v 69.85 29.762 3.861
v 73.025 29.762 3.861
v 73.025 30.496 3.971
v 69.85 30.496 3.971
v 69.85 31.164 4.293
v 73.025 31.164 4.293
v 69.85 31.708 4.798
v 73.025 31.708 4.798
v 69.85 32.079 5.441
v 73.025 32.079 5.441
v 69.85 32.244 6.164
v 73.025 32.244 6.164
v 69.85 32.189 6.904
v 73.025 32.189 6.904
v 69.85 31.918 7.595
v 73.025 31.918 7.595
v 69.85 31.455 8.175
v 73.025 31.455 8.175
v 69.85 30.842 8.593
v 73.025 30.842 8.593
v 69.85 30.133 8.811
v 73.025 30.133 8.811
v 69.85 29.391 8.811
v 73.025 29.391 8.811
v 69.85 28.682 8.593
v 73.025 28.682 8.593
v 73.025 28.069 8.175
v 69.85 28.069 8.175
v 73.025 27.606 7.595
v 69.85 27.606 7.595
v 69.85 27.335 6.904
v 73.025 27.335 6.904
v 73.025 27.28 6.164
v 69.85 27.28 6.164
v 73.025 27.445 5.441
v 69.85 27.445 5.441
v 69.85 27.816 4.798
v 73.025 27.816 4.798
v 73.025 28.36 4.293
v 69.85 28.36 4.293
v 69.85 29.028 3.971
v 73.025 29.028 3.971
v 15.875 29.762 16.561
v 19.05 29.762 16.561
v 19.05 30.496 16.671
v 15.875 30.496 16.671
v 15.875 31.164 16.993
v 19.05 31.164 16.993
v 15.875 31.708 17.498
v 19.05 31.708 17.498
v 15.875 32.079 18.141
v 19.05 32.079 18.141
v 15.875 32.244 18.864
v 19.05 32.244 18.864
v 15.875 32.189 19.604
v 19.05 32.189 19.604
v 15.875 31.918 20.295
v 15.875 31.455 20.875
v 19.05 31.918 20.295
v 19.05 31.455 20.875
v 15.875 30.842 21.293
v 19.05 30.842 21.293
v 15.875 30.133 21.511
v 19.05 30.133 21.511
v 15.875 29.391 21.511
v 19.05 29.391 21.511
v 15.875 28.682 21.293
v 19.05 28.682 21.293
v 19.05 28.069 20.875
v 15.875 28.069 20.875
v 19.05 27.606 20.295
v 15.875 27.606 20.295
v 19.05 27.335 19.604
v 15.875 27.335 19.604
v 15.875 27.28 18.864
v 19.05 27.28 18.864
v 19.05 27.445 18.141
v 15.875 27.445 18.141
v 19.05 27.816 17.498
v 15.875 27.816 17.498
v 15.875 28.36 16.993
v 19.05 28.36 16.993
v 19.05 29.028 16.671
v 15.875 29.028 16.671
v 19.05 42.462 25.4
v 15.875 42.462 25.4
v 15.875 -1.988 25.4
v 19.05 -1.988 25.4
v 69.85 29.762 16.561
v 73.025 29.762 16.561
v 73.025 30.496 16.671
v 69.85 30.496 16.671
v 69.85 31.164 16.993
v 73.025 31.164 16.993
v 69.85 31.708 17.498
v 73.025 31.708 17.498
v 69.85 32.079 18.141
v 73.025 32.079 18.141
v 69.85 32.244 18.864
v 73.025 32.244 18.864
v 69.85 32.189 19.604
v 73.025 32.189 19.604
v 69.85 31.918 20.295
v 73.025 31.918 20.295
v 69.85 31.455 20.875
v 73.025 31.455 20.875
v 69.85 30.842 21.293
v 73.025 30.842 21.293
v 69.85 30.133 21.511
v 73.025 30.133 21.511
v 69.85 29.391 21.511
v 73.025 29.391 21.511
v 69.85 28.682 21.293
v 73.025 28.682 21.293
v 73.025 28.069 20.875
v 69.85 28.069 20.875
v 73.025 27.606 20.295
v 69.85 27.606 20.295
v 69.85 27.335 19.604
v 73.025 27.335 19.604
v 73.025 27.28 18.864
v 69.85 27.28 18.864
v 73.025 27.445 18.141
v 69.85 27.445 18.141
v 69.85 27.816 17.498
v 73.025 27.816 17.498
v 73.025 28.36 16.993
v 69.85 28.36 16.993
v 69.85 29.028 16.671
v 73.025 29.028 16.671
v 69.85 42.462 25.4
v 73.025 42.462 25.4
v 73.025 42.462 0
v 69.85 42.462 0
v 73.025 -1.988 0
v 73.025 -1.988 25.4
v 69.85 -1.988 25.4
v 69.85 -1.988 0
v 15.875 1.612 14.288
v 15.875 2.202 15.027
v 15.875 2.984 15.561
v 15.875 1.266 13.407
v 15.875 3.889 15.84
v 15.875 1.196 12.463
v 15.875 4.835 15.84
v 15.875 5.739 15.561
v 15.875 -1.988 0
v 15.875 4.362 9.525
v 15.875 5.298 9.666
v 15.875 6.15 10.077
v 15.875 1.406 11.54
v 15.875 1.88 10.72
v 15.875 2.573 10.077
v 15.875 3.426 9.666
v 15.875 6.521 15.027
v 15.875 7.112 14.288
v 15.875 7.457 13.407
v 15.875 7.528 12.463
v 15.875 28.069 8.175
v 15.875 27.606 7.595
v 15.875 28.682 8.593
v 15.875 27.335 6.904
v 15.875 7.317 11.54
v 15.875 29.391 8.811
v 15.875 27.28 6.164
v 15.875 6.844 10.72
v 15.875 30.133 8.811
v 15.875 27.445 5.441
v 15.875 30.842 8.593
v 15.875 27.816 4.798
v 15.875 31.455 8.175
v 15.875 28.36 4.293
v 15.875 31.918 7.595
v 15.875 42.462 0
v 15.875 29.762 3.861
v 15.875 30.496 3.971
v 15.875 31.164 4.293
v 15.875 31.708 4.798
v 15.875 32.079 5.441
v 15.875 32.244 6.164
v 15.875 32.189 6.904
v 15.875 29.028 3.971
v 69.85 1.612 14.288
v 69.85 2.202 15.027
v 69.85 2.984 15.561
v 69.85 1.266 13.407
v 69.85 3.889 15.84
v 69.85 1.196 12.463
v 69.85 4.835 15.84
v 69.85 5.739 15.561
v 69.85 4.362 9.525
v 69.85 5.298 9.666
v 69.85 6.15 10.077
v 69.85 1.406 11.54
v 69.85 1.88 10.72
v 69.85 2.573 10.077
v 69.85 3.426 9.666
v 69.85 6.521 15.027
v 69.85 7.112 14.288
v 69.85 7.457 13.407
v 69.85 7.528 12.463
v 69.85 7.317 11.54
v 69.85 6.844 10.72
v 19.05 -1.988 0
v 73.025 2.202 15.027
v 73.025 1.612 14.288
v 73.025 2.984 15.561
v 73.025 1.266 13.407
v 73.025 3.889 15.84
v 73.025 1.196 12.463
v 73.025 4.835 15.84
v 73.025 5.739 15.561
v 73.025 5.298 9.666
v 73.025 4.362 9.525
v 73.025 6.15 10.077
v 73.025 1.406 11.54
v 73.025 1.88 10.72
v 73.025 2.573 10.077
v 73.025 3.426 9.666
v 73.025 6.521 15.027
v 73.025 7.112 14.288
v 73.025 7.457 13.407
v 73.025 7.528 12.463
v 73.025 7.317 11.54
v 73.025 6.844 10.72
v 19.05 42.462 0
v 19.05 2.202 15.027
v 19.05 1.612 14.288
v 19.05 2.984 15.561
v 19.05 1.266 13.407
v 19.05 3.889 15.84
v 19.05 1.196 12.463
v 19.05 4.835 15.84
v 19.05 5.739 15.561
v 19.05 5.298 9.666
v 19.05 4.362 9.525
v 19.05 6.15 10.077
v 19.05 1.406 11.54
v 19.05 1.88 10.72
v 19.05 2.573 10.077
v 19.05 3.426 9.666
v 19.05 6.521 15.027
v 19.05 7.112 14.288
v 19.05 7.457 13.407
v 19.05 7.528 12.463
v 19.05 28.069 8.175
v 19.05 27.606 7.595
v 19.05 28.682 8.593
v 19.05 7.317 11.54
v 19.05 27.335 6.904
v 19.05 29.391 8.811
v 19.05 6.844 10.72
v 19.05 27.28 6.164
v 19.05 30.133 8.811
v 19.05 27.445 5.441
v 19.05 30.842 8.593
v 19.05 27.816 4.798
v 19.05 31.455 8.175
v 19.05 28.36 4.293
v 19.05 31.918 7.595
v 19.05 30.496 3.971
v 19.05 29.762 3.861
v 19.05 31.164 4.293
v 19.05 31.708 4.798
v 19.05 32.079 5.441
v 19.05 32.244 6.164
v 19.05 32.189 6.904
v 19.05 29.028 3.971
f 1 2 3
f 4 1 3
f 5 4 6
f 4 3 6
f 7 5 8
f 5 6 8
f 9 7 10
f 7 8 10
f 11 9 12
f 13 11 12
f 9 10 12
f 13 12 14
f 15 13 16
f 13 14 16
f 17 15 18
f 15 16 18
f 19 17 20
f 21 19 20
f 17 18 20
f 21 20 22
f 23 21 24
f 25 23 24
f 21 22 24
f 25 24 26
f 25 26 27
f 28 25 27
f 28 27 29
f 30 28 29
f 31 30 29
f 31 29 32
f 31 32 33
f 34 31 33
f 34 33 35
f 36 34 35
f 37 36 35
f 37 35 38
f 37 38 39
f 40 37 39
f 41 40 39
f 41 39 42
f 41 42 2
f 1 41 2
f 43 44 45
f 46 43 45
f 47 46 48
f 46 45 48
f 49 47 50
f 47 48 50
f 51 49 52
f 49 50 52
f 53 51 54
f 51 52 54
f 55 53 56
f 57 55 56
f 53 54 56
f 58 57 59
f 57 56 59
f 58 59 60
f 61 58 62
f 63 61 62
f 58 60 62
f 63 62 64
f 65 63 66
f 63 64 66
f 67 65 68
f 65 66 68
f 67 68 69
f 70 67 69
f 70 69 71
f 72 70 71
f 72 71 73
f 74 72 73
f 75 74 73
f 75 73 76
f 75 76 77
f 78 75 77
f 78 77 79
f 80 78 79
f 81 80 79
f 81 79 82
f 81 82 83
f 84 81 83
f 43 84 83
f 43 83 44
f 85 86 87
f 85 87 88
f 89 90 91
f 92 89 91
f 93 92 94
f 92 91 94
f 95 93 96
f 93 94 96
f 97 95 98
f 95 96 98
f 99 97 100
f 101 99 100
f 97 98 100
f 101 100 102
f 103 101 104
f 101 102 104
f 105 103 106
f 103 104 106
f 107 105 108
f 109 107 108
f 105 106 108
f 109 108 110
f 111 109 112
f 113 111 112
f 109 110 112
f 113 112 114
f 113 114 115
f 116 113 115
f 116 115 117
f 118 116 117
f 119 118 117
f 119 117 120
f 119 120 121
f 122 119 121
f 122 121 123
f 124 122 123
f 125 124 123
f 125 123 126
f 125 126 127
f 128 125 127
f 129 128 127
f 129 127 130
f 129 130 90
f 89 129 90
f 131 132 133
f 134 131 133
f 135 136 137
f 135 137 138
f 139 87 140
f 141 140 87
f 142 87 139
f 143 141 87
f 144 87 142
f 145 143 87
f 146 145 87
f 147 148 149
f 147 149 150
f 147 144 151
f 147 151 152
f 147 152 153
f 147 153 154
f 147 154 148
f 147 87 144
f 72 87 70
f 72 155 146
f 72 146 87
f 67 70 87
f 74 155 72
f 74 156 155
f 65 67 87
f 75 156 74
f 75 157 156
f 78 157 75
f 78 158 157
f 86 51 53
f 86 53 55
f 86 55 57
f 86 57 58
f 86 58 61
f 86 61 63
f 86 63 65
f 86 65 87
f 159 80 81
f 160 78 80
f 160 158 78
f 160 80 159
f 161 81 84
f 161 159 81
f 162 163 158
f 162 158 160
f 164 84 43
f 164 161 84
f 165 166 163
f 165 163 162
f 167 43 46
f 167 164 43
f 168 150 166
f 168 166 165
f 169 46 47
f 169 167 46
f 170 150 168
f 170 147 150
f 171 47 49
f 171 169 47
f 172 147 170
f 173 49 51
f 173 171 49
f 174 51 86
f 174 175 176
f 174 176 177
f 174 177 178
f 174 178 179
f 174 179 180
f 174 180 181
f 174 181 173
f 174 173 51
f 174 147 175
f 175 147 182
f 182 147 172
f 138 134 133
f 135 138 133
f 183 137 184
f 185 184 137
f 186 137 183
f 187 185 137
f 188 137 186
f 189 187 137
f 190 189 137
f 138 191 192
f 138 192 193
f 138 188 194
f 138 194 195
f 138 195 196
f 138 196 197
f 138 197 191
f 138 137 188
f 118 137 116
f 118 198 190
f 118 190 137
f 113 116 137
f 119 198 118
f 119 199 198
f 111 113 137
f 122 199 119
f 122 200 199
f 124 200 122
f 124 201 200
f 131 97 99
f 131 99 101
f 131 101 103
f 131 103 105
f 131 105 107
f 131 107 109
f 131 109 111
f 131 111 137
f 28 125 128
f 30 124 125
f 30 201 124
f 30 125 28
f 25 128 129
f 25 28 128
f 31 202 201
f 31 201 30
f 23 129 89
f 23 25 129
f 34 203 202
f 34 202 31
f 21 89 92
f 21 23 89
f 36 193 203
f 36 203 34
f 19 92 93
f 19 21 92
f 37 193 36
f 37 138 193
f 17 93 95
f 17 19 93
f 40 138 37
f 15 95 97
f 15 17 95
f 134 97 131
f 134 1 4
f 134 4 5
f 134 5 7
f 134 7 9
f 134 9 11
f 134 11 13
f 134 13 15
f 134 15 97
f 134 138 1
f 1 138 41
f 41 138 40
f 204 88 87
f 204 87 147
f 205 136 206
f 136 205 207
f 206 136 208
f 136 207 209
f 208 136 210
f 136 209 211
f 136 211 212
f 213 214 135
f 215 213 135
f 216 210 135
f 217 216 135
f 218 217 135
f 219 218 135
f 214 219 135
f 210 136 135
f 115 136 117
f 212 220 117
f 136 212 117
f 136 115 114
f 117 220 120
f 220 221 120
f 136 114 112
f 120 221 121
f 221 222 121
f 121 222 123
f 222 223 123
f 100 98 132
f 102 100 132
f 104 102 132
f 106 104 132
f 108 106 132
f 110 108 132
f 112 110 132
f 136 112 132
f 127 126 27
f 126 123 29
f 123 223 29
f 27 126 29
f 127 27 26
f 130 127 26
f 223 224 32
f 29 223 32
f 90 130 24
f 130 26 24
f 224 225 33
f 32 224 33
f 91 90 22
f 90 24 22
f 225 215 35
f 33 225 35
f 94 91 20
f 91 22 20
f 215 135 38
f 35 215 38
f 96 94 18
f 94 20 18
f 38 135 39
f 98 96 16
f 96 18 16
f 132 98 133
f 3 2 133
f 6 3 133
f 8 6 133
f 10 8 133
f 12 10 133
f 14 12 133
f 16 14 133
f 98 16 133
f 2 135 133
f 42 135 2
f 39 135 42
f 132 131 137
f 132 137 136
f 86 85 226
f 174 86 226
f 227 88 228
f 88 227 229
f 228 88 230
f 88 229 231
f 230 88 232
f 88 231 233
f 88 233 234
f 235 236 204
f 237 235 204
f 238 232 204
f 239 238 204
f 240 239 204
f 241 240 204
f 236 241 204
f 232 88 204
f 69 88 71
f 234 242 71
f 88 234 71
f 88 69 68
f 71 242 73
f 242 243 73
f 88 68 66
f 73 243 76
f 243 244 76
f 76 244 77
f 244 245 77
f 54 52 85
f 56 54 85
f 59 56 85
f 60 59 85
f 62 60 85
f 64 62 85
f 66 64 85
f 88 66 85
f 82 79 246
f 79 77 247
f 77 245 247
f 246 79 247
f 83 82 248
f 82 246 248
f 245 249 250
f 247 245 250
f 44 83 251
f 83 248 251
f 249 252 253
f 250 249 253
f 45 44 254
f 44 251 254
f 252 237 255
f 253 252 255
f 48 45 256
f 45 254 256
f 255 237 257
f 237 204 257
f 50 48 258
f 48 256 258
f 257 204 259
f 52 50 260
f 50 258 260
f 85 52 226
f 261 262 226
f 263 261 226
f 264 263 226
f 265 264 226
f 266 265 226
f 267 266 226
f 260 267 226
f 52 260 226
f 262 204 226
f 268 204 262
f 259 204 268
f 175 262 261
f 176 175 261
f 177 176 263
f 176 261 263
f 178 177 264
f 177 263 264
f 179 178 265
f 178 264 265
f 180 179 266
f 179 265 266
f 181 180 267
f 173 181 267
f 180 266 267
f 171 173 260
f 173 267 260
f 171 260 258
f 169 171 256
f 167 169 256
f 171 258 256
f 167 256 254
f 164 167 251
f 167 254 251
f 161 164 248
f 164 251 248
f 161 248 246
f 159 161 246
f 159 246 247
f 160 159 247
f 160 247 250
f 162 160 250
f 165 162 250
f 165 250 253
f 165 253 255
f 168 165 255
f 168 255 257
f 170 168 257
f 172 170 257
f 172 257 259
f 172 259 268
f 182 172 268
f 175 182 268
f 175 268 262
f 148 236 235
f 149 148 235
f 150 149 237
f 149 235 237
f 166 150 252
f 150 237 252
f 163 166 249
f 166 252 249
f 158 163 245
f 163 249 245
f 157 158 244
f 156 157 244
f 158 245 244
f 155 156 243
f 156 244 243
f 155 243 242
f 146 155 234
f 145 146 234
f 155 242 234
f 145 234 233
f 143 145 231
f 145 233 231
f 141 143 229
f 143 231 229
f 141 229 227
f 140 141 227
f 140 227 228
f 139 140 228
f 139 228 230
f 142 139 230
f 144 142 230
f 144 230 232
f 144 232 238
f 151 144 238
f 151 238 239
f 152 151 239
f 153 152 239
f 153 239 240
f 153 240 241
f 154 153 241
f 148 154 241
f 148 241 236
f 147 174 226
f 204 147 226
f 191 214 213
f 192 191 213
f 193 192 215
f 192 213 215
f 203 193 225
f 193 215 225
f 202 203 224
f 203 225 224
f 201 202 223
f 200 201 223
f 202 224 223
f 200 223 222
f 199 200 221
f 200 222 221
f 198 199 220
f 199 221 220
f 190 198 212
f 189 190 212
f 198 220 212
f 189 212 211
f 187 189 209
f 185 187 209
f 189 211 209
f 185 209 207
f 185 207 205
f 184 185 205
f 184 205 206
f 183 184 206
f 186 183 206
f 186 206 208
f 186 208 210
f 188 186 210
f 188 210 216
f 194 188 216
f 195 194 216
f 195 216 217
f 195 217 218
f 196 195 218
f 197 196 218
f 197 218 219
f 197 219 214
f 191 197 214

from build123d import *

# Parameters (mm, degrees)
SKETCH1_W             = 3.175
SKETCH1_H             = 68.663112769
BOSS_EXTRUDE1_DEPTH   = 25.4
BOSS_EXTRUDE1_2_DEPTH = 25.4
SKETCH2_R             = 3.175
SKETCH2_R_2           = 2.4892
CUT_EXTRUDE1_DEPTH    = 58.15
SKETCH3_W             = 25.4
SKETCH3_H             = 9.525
SKETCH3_H_2           = 14.688112769
CUT_EXTRUDE3_DEPTH    = 58.15


with BuildPart() as part:
    # Sketch1 → Boss-Extrude1 (new body)
    with BuildSketch(Plane.XY):
        with Locations((71.4375, 22.818443616)):
            Rectangle(SKETCH1_W, SKETCH1_H)
    extrude(amount=BOSS_EXTRUDE1_DEPTH)


with BuildPart() as body_2:
    # Sketch1 → Boss-Extrude1 2 (new body)
    with BuildSketch(Plane.XY):
        with Locations((17.4625, 22.818443616)):
            Rectangle(SKETCH1_W, SKETCH1_H)
    extrude(amount=BOSS_EXTRUDE1_2_DEPTH)


with BuildPart() as cut_extrude1_tool:
    # Sketch2 → Cut-Extrude1 (new body, through all)
    with BuildSketch(Plane(origin=(73.025, 0, 0), x_dir=(0, 0, -1), z_dir=(1, 0, 0))):
        with Locations((-12.7, 4.361887231)):
            Circle(SKETCH2_R)
        with Locations((-19.05, 29.761887231)):
            Circle(SKETCH2_R_2)
        with Locations((-6.35, 29.761887231)):
            Circle(SKETCH2_R_2)
    extrude(amount=-CUT_EXTRUDE1_DEPTH)


with BuildPart() as part_1:
    add(part.part)

    # Cut-Extrude1: cut by cut_extrude1_tool
    add(cut_extrude1_tool.part, mode=Mode.SUBTRACT)


with BuildPart() as body_2_1:
    add(body_2.part)

    # Cut-Extrude1: cut by cut_extrude1_tool
    add(cut_extrude1_tool.part, mode=Mode.SUBTRACT)


with BuildPart() as cut_extrude3_tool:
    # Sketch3 → Cut-Extrude3 (new body, through all)
    with BuildSketch(Plane(origin=(73.025, 0, 0), x_dir=(0, 0, -1), z_dir=(1, 0, 0))):
        with Locations((-12.7, -6.750612769)):
            Rectangle(SKETCH3_W, SKETCH3_H)
        with Locations((-12.7, 49.805943616)):
            Rectangle(SKETCH3_W, SKETCH3_H_2)
    extrude(amount=-CUT_EXTRUDE3_DEPTH)


with BuildPart() as part_2:
    add(part_1.part)

    # Cut-Extrude3: cut by cut_extrude3_tool
    add(cut_extrude3_tool.part, mode=Mode.SUBTRACT)


with BuildPart() as body_2_2:
    add(body_2_1.part)

    # Cut-Extrude3: cut by cut_extrude3_tool
    add(cut_extrude3_tool.part, mode=Mode.SUBTRACT)


solid = Compound([part_2.part, body_2_2.part])
